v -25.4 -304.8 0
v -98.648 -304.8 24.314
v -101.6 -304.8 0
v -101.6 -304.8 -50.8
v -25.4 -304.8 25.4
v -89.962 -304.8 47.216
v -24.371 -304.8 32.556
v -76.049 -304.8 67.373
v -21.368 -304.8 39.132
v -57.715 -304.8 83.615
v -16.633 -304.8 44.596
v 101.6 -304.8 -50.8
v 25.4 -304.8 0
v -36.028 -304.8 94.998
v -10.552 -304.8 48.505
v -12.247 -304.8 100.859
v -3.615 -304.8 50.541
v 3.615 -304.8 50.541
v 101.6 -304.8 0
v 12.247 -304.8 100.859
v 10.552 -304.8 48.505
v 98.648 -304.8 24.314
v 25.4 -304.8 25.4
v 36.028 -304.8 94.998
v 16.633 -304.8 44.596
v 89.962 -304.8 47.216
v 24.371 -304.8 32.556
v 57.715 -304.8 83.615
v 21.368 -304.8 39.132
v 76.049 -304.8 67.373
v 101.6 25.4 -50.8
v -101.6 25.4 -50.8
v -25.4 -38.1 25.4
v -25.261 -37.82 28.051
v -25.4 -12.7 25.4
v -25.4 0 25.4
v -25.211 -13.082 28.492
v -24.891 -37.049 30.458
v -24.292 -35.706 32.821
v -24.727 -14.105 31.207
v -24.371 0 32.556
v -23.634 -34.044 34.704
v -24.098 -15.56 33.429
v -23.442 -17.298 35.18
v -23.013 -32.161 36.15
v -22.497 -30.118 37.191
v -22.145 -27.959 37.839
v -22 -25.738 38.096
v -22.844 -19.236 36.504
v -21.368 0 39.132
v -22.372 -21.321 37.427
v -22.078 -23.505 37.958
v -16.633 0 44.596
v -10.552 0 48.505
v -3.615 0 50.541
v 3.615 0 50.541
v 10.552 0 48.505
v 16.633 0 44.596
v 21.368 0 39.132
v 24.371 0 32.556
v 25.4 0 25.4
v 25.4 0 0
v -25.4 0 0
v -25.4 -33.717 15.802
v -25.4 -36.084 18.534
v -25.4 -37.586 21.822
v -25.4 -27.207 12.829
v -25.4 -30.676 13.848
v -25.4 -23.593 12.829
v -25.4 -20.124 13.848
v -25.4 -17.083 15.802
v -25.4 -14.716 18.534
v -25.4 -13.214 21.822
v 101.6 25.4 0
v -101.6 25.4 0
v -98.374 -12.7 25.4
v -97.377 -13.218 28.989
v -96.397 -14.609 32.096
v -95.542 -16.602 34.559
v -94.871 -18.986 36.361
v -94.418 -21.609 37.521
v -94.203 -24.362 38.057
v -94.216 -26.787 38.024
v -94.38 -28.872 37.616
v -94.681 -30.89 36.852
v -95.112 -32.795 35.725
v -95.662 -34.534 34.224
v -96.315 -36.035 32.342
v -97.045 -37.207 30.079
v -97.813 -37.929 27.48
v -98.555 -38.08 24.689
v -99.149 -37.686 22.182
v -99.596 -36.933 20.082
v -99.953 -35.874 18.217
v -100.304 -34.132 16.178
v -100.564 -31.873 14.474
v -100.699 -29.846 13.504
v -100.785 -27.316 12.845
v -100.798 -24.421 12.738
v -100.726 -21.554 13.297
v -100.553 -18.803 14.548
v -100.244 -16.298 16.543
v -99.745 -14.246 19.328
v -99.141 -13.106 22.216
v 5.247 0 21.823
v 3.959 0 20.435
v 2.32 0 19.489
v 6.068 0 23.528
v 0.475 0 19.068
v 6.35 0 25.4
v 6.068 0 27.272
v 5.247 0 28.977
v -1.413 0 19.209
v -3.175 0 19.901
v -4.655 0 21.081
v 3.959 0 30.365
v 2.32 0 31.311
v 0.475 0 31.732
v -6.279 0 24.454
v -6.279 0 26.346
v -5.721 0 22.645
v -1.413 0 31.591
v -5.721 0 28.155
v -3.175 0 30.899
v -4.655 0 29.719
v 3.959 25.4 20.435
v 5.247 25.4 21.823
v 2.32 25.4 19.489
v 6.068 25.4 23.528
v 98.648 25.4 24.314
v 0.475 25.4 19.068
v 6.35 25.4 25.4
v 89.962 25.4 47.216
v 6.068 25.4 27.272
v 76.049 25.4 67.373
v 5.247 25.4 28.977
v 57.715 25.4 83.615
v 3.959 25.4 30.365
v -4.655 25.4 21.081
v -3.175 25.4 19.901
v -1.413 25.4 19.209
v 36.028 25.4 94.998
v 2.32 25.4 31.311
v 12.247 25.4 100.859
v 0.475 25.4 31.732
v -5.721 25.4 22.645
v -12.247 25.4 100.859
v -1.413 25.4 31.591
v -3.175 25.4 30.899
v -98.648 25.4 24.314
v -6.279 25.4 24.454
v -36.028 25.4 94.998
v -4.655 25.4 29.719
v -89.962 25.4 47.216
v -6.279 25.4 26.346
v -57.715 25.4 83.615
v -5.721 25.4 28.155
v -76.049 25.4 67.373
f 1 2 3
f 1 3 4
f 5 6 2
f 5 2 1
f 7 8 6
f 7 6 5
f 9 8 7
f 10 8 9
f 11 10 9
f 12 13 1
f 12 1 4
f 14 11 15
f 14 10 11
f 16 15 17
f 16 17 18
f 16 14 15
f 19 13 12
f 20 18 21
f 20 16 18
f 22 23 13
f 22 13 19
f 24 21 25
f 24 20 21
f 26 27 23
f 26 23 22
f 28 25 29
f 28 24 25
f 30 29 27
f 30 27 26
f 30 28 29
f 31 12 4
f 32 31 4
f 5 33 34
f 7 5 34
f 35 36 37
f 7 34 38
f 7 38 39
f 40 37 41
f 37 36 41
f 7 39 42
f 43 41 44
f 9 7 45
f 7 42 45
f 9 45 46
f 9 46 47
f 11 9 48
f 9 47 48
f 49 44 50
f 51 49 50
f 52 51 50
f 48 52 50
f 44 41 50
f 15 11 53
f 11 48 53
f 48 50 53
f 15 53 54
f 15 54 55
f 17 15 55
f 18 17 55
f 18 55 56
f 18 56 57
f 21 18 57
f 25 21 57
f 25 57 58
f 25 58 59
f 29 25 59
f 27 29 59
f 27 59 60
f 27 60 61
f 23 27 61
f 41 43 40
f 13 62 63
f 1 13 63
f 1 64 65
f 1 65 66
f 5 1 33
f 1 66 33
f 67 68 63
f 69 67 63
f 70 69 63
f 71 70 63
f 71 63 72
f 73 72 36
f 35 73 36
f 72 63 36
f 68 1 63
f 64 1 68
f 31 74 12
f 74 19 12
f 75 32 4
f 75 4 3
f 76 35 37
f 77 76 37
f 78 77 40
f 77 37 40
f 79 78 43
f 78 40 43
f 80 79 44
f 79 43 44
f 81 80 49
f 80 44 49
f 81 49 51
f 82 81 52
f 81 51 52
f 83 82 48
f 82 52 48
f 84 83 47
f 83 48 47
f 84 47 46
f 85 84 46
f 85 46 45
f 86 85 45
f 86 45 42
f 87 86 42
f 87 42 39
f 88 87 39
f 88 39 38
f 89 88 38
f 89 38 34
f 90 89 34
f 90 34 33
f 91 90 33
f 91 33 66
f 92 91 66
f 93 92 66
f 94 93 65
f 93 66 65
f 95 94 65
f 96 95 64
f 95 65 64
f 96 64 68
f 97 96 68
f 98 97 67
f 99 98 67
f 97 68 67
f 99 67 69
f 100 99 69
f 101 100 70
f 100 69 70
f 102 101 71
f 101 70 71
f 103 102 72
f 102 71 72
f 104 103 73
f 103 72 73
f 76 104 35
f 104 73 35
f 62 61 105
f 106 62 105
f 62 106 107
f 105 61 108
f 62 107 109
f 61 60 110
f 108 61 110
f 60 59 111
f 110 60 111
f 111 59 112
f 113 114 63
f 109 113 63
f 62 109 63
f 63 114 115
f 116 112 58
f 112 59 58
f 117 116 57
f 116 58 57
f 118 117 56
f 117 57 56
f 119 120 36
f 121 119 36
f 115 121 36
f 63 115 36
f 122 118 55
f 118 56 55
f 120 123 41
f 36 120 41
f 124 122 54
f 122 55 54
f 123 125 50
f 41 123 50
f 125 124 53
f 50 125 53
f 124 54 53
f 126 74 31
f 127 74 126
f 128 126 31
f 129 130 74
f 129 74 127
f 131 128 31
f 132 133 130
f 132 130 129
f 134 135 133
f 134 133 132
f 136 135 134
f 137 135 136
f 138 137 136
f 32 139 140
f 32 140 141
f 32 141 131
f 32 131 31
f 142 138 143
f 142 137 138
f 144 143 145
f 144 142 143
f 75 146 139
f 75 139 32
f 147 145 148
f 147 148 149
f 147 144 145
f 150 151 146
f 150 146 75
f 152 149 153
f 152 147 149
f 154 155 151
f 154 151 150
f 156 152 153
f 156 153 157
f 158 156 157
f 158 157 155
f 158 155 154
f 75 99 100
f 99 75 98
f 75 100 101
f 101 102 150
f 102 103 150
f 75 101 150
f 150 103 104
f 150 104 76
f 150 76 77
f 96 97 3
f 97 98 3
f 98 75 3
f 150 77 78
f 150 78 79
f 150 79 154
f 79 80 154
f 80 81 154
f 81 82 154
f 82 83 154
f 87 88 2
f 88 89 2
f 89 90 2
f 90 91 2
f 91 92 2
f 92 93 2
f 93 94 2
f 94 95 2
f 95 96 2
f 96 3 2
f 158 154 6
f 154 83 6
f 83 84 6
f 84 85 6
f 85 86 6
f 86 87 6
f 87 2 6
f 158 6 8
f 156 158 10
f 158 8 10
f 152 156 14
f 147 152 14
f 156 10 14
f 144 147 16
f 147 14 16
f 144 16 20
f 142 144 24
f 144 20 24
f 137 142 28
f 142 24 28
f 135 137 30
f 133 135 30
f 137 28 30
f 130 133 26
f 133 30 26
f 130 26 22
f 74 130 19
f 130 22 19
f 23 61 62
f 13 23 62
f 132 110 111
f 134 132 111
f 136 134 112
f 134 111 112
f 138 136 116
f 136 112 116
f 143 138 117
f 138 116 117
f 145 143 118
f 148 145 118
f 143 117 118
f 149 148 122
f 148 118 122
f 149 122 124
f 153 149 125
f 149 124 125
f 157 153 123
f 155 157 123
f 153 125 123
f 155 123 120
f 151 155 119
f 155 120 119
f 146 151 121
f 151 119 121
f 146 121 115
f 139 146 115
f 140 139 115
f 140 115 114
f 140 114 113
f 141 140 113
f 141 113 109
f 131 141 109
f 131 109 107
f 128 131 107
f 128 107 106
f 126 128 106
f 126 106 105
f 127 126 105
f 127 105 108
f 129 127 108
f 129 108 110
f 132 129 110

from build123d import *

# Parameters (mm, degrees)
F1_DEPTH = 304.8
F3_DEPTH = 25.4
F4_R     = 6.35
F5_DEPTH = 25.401
F6_R     = 12.7
F7_DEPTH = 101.601


with BuildPart() as f1:
    # F0 (on Front) → F1 (new body)
    with BuildSketch(Plane.XZ):
        with BuildLine():
            ThreePointArc((-25.4, 25.4), (0, 50.8), (25.4, 25.4))
            Line((25.4, 25.4), (25.4, 0))
            Line((25.4, 0), (101.6, 0))
            ThreePointArc((101.6, 0), (0, 101.6), (-101.6, 0))
            Line((-101.6, 0), (-25.4, 0))
            Line((-25.4, 0), (-25.4, 25.4))
        make_face()
        Polygon((101.6, 0), (25.4, 0), (0, 0), (-25.4, 0), (-101.6, 0), (-101.6, -50.8), (101.6, -50.8), align=None)
    extrude(amount=F1_DEPTH)

    # F2 (on face) → F3 (join)
    with BuildSketch(Plane(origin=(0, 0, 0), x_dir=(-1, 0, 0), z_dir=(0, 1, 0))):
        with BuildLine():
            Line((101.6, -50.8), (101.6, 0))
            ThreePointArc((101.6, 0), (0, 101.6), (-101.6, 0))
            Line((-101.6, 0), (-101.6, -50.8))
            Line((-101.6, -50.8), (101.6, -50.8))
        make_face()
    extrude(amount=F3_DEPTH)

    # F4 (on Front) → F5 (cut, through all)
    with BuildSketch(Plane.XZ):
        with Locations((0, 25.4)):
            Circle(F4_R)
    extrude(amount=-F5_DEPTH, mode=Mode.SUBTRACT)

    # F6 (on Right) → F7 (cut, through all)
    with BuildSketch(Plane.YZ):
        with Locations((-25.4, 25.4)):
            Circle(F6_R)
    extrude(amount=-F7_DEPTH, mode=Mode.SUBTRACT)


solid = f1.part
